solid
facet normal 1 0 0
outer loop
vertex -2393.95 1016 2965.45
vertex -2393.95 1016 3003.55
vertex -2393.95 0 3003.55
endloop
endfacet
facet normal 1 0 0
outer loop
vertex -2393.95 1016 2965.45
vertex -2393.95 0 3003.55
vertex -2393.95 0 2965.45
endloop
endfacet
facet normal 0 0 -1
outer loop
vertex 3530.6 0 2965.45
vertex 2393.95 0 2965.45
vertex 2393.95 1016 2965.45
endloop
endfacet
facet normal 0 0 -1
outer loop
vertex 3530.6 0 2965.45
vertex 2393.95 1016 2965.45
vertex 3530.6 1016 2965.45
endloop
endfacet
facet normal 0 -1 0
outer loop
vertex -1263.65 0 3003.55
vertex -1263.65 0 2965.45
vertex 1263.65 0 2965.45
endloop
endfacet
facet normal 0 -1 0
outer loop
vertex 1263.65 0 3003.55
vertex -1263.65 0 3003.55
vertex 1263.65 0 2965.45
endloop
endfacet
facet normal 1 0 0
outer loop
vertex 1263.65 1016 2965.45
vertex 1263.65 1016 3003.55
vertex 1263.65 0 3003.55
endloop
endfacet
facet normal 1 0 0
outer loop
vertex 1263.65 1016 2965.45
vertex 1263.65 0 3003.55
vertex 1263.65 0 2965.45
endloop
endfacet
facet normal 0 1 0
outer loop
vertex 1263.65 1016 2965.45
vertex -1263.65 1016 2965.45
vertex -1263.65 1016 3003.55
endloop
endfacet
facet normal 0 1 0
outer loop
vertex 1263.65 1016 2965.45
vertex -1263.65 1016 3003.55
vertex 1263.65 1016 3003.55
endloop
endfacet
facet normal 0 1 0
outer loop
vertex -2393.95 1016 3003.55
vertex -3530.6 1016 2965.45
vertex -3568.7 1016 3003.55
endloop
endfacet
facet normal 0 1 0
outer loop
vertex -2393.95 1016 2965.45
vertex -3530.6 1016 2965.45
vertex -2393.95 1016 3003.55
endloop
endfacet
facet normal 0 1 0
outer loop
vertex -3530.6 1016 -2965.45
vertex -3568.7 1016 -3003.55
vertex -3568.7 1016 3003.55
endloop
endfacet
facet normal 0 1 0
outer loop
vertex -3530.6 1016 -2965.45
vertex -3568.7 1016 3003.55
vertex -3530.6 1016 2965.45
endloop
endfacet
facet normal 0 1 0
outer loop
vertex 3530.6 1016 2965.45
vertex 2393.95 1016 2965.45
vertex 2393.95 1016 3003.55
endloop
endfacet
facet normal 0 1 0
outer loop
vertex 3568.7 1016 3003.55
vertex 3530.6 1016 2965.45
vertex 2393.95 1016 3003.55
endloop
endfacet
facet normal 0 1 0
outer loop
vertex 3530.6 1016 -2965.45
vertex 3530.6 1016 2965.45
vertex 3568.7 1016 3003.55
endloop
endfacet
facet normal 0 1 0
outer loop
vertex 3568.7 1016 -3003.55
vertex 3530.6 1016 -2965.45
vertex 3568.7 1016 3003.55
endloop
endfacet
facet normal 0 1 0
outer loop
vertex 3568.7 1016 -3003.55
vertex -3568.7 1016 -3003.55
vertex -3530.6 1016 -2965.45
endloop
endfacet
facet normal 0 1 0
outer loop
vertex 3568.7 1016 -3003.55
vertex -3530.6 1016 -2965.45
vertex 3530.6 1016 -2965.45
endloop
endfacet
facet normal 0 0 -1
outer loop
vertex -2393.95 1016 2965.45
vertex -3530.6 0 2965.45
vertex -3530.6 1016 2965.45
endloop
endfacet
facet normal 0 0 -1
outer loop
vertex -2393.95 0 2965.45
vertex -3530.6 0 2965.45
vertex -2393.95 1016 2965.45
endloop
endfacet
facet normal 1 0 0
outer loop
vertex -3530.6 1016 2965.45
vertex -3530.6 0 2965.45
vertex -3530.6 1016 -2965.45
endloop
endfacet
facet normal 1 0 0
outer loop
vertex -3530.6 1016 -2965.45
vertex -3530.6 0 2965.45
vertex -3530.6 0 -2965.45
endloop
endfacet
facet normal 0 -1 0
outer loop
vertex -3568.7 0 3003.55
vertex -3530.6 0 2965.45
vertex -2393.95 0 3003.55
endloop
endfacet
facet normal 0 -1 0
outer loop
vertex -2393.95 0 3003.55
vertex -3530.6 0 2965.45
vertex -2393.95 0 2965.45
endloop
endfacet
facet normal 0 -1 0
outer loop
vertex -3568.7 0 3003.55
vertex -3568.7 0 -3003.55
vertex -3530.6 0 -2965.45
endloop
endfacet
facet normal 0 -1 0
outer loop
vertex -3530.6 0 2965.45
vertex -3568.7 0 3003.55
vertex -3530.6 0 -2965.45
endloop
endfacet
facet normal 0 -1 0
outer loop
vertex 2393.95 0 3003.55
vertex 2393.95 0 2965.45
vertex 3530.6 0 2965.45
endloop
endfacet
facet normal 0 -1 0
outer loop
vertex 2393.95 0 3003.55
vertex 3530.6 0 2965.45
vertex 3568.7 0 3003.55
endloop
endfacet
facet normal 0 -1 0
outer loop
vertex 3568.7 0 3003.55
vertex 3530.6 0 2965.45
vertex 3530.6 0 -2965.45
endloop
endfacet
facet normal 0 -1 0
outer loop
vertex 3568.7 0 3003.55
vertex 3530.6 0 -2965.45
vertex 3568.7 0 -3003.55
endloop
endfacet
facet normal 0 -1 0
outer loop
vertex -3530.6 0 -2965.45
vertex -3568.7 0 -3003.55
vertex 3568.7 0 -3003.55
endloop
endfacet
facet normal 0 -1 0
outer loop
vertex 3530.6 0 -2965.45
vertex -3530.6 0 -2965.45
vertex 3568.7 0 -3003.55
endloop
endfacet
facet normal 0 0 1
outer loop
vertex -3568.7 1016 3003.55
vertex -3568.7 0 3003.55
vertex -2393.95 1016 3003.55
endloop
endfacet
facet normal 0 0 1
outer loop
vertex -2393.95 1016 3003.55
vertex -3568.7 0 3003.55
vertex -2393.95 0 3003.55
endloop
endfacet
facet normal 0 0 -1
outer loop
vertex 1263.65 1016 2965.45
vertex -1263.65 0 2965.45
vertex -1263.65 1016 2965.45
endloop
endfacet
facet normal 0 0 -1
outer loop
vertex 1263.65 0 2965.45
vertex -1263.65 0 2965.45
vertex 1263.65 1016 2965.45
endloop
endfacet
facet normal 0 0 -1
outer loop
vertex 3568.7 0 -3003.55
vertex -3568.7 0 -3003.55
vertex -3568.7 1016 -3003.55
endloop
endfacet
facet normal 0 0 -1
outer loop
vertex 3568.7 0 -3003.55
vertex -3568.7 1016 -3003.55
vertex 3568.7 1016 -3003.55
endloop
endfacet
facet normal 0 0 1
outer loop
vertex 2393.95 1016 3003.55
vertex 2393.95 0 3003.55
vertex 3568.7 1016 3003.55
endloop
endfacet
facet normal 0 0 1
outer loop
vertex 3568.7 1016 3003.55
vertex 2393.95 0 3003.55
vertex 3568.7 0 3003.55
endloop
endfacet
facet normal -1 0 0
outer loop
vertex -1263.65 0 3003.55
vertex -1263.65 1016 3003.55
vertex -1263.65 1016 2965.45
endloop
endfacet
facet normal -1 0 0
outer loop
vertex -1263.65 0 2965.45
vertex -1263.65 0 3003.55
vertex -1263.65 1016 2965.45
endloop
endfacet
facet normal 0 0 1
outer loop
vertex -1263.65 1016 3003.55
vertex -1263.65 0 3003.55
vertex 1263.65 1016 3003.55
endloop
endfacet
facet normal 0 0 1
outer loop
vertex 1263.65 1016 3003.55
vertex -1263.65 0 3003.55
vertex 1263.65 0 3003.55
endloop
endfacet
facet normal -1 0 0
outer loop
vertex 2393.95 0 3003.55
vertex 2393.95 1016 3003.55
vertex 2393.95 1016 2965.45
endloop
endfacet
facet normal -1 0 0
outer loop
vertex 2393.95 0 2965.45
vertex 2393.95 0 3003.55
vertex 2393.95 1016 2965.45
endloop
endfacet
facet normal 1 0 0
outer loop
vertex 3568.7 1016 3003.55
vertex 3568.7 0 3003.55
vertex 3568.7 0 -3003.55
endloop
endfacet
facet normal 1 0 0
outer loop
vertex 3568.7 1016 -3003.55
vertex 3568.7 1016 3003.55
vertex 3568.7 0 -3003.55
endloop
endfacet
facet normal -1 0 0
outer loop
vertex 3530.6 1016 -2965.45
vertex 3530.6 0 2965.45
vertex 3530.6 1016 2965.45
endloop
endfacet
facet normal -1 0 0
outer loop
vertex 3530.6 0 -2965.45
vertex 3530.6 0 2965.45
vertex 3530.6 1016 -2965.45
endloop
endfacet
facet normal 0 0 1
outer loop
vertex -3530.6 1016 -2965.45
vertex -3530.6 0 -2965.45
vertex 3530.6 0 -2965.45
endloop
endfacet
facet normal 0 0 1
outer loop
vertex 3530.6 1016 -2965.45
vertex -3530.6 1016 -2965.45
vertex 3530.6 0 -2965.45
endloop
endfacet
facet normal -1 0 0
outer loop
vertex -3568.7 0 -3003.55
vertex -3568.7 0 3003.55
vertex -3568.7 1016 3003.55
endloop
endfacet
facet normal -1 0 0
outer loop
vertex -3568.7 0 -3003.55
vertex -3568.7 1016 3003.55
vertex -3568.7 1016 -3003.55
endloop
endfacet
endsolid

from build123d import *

# Parameters (mm, degrees)
SKETCH1_W           = 7137.4
SKETCH1_H           = 6007.1
SKETCH1_W_2         = 7061.2
SKETCH1_H_2         = 5930.9
BOSS_EXTRUDE1_DEPTH = 1016
SKETCH2_W           = 1130.3
SKETCH2_H           = 38.1
CUT_EXTRUDE1_DEPTH  = 2048.764


with BuildPart() as part:
    # Sketch1 → Boss-Extrude1 (new body)
    with BuildSketch(Plane(origin=(0, 0, 0), x_dir=(1, 0, 0), z_dir=(0, 1, 0))):
        Rectangle(SKETCH1_W, SKETCH1_H)
        Rectangle(SKETCH1_W_2, SKETCH1_H_2, mode=Mode.SUBTRACT)
    extrude(amount=BOSS_EXTRUDE1_DEPTH)

    # Sketch2 → Cut-Extrude1 (cut)
    with BuildSketch(Plane(origin=(0, 1016, 0), x_dir=(1, 0, 0), z_dir=(0, 1, 0))):
        with Locations((-1828.8, -2984.5)):
            Rectangle(SKETCH2_W, SKETCH2_H)
        with Locations((1828.8, -2984.5)):
            Rectangle(SKETCH2_W, SKETCH2_H)
    extrude(amount=-CUT_EXTRUDE1_DEPTH, mode=Mode.SUBTRACT)


solid = part.part
